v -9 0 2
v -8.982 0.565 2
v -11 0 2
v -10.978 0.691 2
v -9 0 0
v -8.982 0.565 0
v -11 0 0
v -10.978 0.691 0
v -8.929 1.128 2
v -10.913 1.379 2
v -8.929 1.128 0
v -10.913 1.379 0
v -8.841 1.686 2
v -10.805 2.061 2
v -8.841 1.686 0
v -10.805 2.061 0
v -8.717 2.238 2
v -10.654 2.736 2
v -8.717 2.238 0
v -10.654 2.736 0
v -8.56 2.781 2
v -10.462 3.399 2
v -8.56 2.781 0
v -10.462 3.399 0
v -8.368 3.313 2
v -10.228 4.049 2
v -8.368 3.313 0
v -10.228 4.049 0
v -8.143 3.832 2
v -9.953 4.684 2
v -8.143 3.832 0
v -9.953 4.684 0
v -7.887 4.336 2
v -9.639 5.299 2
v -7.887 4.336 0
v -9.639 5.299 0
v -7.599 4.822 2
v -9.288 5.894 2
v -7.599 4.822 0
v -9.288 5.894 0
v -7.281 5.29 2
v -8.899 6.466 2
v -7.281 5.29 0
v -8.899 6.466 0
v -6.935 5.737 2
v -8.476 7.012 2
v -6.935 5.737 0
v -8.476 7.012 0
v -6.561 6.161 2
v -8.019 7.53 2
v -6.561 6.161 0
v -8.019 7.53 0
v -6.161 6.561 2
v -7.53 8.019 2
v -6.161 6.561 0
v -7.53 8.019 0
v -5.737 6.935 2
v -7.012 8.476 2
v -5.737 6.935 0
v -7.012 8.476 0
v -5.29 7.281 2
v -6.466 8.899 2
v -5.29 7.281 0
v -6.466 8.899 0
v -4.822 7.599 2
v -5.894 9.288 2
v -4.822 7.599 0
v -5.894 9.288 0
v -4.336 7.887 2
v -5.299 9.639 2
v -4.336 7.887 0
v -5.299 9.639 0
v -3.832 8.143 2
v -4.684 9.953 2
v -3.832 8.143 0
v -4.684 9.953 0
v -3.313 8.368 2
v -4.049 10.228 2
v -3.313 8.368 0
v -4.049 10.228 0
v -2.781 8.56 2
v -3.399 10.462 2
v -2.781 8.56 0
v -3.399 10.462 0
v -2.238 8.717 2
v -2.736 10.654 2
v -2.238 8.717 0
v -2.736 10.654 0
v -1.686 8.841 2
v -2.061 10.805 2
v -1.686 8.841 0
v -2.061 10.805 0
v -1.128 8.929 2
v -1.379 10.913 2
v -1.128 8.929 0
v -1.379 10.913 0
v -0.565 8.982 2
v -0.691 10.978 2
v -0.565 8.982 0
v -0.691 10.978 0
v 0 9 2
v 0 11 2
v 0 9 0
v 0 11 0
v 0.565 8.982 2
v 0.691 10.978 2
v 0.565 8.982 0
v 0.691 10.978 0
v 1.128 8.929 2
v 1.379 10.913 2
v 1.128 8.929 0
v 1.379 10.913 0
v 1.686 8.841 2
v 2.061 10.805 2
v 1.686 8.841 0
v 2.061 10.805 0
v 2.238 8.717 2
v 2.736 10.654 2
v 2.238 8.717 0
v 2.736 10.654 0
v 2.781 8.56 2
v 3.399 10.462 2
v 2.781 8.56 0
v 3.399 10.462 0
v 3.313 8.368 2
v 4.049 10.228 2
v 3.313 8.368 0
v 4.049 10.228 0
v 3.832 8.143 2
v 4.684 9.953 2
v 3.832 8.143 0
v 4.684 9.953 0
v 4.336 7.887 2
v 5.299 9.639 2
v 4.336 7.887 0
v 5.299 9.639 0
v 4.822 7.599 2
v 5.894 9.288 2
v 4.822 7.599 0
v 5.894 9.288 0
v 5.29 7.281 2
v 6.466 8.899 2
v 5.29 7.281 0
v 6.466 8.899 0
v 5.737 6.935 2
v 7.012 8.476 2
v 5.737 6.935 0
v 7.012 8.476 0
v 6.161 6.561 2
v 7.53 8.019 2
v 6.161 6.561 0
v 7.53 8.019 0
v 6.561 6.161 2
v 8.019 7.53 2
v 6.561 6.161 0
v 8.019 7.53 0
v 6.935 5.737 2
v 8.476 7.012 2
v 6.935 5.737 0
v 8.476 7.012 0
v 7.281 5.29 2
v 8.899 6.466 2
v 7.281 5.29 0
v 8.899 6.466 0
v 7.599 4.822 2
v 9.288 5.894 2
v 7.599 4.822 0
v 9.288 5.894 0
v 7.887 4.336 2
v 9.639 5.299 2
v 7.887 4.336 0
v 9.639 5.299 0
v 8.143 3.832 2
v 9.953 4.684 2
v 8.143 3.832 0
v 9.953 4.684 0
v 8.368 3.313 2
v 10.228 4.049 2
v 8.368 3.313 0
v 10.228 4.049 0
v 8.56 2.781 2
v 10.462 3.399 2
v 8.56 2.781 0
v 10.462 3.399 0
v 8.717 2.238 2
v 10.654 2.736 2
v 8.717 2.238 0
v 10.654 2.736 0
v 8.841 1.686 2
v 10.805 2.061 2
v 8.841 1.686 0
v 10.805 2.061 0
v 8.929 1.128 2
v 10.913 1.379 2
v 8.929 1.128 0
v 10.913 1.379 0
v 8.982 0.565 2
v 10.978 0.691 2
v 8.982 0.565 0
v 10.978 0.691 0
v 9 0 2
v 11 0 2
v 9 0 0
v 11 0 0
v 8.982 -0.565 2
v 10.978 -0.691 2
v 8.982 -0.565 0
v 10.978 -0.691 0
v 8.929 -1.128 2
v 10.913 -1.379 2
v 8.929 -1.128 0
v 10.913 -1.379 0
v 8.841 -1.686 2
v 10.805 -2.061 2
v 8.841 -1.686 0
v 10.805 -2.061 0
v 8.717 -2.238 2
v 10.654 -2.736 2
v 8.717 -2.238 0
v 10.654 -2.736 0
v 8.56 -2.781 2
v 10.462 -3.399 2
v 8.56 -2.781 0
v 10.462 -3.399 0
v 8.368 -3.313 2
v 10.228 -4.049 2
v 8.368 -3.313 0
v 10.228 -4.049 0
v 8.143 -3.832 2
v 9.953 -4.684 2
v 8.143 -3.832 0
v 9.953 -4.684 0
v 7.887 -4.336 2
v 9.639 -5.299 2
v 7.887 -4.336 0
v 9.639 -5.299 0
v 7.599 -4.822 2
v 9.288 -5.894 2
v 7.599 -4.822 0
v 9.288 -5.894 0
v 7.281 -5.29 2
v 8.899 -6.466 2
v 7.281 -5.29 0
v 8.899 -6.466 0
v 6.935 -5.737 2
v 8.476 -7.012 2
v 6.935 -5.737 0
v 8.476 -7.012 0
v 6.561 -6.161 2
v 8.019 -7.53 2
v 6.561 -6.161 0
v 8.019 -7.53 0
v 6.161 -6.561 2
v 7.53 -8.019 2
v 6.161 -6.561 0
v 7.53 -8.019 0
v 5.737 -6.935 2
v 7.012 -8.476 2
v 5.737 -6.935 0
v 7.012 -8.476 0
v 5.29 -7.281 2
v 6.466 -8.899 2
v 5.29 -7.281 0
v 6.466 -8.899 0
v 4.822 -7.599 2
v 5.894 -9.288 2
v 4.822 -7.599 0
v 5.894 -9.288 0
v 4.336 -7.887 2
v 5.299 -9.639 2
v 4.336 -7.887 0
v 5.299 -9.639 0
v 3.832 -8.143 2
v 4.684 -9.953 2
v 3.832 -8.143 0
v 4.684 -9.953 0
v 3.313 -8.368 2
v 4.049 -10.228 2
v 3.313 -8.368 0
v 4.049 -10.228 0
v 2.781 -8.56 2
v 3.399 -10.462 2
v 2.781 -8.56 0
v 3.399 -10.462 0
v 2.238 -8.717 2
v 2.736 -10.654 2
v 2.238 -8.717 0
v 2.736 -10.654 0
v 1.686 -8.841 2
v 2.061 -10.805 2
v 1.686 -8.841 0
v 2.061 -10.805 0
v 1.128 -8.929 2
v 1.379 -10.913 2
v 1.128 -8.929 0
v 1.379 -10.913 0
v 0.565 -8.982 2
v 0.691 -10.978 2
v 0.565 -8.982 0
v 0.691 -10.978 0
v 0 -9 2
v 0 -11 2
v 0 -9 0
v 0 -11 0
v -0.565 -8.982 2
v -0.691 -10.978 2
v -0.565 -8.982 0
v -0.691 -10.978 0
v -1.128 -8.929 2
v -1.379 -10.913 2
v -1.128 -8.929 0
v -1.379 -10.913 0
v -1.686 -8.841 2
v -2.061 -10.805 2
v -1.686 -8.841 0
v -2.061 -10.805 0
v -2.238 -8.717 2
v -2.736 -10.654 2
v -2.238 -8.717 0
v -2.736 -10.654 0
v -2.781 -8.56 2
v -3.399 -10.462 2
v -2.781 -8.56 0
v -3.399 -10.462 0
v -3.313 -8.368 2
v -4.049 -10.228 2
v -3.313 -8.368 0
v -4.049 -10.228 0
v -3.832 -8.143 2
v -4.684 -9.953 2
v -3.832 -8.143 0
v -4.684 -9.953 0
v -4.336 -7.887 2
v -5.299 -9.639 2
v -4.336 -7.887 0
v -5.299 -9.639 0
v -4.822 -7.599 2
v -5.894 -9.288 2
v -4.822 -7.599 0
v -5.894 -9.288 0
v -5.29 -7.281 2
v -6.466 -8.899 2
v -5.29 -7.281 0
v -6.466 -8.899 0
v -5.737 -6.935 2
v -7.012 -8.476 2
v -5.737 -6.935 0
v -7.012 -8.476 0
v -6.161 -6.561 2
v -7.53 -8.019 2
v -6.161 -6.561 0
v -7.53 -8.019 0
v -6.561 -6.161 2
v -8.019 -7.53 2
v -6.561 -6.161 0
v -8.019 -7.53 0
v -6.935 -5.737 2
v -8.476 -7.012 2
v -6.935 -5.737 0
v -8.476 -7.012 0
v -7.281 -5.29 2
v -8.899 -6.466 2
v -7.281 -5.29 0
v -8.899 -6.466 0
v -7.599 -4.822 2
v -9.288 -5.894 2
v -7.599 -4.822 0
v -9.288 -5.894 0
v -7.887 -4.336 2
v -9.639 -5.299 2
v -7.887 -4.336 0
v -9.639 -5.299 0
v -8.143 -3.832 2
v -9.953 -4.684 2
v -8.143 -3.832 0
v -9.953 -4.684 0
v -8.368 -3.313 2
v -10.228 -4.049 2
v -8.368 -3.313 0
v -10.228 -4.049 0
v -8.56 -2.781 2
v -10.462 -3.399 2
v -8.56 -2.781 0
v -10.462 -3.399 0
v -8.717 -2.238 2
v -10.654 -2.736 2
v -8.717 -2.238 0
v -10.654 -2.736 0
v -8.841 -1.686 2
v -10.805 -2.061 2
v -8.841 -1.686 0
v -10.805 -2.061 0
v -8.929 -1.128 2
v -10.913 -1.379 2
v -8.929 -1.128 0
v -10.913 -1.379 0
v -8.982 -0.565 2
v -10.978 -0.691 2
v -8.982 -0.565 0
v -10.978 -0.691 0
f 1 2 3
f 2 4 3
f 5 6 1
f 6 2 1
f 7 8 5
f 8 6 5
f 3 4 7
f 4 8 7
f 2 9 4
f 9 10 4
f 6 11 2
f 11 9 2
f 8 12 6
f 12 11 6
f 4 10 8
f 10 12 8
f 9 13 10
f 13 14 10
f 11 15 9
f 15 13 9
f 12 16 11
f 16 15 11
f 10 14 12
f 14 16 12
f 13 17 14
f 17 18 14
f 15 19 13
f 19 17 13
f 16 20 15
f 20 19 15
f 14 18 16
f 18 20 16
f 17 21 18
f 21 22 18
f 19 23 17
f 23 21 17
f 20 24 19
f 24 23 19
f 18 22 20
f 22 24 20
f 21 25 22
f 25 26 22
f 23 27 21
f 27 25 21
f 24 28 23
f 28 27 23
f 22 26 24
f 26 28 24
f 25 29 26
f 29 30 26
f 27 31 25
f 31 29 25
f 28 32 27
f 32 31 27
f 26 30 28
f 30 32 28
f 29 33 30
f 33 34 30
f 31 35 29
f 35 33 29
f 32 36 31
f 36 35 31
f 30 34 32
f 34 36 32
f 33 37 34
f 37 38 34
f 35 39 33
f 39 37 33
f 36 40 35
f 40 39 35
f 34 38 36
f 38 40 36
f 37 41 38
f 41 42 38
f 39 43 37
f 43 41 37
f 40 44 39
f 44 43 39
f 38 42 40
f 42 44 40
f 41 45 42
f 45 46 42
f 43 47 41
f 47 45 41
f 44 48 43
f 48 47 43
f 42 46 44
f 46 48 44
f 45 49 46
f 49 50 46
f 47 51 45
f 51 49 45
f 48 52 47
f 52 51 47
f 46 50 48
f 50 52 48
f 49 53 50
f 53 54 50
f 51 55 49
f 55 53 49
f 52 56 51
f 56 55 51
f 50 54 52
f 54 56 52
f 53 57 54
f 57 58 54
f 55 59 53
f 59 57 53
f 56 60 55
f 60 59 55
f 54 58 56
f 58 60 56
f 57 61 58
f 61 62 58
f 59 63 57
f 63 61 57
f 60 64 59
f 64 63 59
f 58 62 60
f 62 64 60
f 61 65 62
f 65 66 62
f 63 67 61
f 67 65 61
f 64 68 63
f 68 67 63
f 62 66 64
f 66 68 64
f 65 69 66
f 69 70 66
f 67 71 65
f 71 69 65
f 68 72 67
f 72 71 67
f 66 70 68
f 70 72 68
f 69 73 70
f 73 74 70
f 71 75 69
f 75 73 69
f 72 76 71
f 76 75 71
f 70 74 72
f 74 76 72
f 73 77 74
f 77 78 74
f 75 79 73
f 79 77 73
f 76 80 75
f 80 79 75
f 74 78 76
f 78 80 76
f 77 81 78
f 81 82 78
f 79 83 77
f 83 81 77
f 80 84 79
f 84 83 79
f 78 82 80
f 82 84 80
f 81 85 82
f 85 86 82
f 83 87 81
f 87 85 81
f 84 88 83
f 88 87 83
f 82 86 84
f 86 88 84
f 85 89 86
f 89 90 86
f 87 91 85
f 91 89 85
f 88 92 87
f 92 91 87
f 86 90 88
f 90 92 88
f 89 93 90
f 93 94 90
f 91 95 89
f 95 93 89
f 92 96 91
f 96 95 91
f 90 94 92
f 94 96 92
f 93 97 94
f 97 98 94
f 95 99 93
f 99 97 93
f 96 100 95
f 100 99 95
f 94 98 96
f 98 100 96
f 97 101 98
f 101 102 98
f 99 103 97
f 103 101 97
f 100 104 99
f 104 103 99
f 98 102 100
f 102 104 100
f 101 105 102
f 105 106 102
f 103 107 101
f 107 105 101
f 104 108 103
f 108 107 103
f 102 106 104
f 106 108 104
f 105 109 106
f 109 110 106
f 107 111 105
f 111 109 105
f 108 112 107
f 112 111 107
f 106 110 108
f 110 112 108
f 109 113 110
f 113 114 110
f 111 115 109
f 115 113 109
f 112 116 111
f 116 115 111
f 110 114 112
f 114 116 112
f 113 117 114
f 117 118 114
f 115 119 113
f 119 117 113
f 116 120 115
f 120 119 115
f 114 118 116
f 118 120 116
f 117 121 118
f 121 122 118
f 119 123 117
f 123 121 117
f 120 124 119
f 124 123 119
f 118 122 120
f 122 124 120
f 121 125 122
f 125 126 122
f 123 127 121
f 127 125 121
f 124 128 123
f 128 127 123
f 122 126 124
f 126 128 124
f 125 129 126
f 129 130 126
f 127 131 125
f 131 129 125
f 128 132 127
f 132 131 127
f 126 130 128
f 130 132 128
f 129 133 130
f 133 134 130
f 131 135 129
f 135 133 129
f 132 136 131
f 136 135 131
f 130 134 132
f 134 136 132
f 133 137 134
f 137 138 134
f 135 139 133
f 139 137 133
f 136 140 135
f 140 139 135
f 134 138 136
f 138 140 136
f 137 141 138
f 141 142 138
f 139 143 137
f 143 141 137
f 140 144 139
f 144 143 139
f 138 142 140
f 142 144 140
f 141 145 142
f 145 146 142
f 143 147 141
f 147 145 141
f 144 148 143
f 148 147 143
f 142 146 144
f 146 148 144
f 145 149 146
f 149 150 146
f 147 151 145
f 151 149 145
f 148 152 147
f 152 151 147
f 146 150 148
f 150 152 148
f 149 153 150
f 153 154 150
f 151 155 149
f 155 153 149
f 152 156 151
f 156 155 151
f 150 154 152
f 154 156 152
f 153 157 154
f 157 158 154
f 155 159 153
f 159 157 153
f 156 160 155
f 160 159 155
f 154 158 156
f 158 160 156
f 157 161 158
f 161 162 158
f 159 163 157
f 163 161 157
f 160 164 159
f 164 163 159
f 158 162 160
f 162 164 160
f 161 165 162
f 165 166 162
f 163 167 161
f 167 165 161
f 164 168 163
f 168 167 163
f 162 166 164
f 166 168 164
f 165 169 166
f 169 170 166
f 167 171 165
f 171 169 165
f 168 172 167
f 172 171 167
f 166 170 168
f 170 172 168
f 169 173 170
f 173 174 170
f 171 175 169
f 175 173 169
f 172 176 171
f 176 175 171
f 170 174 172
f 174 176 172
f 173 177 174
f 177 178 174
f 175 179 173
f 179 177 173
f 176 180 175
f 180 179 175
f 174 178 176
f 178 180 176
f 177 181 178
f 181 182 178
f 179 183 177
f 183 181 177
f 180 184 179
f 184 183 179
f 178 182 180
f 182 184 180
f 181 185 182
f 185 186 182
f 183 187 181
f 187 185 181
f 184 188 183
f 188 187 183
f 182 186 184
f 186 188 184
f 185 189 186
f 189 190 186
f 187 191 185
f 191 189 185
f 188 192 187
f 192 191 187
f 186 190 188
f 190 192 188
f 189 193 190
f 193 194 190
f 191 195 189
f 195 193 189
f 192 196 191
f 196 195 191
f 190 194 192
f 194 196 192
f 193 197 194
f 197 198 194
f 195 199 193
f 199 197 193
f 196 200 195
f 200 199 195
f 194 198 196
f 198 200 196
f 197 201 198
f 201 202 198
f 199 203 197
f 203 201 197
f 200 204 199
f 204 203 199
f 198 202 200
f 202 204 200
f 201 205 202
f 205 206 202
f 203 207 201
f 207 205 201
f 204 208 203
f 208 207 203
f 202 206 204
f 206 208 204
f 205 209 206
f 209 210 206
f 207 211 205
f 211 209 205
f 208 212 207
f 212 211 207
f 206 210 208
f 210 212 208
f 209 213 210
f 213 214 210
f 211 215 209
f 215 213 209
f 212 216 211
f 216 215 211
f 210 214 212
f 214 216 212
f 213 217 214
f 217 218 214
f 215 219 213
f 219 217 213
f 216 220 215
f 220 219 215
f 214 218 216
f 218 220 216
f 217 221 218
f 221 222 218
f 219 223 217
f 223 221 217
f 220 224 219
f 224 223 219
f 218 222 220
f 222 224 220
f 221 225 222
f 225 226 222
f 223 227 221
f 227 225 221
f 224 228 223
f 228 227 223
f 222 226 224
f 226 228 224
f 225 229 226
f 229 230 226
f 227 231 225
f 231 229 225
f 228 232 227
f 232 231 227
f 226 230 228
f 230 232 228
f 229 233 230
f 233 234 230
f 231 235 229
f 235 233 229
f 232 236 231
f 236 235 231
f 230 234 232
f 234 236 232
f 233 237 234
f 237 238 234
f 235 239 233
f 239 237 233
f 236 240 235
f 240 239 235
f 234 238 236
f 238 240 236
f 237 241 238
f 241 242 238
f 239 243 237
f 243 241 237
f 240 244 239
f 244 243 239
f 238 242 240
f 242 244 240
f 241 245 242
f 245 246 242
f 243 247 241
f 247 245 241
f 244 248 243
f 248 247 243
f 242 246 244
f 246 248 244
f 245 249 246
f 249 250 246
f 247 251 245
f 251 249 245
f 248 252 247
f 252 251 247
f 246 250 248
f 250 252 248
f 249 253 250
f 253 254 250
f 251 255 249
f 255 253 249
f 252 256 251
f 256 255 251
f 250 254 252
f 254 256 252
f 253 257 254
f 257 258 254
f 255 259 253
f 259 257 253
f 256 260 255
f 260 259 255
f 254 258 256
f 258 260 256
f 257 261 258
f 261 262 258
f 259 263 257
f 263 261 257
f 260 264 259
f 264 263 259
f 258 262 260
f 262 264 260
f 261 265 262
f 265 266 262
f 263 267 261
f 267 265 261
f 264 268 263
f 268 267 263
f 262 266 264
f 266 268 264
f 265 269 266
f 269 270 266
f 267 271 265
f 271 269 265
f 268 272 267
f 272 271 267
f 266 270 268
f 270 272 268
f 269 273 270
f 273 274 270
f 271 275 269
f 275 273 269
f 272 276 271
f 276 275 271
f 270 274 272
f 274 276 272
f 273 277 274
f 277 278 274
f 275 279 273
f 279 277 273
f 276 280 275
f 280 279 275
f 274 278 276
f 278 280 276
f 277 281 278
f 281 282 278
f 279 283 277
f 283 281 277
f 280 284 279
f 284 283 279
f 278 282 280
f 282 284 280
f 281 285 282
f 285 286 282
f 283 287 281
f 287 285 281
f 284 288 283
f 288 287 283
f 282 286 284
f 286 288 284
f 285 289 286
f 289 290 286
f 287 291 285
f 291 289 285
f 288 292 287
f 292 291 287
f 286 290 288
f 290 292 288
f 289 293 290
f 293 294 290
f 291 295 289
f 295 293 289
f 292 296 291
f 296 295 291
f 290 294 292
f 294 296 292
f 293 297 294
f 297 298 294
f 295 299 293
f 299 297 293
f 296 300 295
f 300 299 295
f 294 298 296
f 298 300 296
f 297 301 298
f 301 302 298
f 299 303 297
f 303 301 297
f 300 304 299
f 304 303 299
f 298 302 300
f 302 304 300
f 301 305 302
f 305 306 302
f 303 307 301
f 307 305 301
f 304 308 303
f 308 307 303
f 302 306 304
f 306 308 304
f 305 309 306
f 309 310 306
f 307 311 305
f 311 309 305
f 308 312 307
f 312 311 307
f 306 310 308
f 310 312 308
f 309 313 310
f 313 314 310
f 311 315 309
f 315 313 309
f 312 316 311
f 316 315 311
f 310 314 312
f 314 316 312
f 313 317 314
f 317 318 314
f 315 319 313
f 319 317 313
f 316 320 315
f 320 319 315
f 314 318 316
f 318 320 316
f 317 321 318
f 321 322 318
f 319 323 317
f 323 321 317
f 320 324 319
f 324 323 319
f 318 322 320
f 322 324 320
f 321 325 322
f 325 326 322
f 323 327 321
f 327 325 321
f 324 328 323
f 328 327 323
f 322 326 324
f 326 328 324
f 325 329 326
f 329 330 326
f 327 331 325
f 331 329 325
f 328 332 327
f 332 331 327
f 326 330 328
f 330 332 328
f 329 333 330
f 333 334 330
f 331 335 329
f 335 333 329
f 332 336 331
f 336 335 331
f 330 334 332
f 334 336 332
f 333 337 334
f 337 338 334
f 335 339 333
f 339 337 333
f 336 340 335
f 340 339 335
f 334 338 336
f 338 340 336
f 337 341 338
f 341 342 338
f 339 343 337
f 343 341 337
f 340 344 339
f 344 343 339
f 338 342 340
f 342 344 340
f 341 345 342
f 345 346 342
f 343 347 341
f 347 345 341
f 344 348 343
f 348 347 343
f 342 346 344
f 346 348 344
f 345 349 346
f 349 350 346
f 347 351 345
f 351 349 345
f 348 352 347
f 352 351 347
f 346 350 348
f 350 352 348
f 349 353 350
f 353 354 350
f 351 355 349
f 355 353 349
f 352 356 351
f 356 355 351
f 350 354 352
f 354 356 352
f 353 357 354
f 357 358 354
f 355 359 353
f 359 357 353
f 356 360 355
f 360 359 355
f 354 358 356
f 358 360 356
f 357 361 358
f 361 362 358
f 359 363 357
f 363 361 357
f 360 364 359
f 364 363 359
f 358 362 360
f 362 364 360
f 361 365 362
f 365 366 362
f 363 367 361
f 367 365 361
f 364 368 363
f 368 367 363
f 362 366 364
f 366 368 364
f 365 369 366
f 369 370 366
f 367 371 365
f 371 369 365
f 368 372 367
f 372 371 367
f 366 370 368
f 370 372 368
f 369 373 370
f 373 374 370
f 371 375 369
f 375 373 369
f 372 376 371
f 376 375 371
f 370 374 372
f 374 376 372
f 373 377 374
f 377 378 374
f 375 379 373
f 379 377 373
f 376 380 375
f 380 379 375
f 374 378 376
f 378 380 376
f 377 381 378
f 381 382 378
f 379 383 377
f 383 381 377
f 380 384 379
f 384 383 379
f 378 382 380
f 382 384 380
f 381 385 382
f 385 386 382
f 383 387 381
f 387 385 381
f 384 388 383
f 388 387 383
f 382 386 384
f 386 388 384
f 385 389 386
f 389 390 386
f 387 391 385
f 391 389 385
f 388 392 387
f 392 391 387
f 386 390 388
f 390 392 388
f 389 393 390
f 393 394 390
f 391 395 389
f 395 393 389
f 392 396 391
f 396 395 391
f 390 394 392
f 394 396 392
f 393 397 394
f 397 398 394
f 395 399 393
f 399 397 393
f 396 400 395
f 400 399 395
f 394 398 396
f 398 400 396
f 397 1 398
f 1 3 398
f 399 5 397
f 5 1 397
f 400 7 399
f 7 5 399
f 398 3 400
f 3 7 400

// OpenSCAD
$fn=100;
rotate_extrude () {
    polygon (points = [[9,0], [11,0], [11,2],[9,2]]);
}
